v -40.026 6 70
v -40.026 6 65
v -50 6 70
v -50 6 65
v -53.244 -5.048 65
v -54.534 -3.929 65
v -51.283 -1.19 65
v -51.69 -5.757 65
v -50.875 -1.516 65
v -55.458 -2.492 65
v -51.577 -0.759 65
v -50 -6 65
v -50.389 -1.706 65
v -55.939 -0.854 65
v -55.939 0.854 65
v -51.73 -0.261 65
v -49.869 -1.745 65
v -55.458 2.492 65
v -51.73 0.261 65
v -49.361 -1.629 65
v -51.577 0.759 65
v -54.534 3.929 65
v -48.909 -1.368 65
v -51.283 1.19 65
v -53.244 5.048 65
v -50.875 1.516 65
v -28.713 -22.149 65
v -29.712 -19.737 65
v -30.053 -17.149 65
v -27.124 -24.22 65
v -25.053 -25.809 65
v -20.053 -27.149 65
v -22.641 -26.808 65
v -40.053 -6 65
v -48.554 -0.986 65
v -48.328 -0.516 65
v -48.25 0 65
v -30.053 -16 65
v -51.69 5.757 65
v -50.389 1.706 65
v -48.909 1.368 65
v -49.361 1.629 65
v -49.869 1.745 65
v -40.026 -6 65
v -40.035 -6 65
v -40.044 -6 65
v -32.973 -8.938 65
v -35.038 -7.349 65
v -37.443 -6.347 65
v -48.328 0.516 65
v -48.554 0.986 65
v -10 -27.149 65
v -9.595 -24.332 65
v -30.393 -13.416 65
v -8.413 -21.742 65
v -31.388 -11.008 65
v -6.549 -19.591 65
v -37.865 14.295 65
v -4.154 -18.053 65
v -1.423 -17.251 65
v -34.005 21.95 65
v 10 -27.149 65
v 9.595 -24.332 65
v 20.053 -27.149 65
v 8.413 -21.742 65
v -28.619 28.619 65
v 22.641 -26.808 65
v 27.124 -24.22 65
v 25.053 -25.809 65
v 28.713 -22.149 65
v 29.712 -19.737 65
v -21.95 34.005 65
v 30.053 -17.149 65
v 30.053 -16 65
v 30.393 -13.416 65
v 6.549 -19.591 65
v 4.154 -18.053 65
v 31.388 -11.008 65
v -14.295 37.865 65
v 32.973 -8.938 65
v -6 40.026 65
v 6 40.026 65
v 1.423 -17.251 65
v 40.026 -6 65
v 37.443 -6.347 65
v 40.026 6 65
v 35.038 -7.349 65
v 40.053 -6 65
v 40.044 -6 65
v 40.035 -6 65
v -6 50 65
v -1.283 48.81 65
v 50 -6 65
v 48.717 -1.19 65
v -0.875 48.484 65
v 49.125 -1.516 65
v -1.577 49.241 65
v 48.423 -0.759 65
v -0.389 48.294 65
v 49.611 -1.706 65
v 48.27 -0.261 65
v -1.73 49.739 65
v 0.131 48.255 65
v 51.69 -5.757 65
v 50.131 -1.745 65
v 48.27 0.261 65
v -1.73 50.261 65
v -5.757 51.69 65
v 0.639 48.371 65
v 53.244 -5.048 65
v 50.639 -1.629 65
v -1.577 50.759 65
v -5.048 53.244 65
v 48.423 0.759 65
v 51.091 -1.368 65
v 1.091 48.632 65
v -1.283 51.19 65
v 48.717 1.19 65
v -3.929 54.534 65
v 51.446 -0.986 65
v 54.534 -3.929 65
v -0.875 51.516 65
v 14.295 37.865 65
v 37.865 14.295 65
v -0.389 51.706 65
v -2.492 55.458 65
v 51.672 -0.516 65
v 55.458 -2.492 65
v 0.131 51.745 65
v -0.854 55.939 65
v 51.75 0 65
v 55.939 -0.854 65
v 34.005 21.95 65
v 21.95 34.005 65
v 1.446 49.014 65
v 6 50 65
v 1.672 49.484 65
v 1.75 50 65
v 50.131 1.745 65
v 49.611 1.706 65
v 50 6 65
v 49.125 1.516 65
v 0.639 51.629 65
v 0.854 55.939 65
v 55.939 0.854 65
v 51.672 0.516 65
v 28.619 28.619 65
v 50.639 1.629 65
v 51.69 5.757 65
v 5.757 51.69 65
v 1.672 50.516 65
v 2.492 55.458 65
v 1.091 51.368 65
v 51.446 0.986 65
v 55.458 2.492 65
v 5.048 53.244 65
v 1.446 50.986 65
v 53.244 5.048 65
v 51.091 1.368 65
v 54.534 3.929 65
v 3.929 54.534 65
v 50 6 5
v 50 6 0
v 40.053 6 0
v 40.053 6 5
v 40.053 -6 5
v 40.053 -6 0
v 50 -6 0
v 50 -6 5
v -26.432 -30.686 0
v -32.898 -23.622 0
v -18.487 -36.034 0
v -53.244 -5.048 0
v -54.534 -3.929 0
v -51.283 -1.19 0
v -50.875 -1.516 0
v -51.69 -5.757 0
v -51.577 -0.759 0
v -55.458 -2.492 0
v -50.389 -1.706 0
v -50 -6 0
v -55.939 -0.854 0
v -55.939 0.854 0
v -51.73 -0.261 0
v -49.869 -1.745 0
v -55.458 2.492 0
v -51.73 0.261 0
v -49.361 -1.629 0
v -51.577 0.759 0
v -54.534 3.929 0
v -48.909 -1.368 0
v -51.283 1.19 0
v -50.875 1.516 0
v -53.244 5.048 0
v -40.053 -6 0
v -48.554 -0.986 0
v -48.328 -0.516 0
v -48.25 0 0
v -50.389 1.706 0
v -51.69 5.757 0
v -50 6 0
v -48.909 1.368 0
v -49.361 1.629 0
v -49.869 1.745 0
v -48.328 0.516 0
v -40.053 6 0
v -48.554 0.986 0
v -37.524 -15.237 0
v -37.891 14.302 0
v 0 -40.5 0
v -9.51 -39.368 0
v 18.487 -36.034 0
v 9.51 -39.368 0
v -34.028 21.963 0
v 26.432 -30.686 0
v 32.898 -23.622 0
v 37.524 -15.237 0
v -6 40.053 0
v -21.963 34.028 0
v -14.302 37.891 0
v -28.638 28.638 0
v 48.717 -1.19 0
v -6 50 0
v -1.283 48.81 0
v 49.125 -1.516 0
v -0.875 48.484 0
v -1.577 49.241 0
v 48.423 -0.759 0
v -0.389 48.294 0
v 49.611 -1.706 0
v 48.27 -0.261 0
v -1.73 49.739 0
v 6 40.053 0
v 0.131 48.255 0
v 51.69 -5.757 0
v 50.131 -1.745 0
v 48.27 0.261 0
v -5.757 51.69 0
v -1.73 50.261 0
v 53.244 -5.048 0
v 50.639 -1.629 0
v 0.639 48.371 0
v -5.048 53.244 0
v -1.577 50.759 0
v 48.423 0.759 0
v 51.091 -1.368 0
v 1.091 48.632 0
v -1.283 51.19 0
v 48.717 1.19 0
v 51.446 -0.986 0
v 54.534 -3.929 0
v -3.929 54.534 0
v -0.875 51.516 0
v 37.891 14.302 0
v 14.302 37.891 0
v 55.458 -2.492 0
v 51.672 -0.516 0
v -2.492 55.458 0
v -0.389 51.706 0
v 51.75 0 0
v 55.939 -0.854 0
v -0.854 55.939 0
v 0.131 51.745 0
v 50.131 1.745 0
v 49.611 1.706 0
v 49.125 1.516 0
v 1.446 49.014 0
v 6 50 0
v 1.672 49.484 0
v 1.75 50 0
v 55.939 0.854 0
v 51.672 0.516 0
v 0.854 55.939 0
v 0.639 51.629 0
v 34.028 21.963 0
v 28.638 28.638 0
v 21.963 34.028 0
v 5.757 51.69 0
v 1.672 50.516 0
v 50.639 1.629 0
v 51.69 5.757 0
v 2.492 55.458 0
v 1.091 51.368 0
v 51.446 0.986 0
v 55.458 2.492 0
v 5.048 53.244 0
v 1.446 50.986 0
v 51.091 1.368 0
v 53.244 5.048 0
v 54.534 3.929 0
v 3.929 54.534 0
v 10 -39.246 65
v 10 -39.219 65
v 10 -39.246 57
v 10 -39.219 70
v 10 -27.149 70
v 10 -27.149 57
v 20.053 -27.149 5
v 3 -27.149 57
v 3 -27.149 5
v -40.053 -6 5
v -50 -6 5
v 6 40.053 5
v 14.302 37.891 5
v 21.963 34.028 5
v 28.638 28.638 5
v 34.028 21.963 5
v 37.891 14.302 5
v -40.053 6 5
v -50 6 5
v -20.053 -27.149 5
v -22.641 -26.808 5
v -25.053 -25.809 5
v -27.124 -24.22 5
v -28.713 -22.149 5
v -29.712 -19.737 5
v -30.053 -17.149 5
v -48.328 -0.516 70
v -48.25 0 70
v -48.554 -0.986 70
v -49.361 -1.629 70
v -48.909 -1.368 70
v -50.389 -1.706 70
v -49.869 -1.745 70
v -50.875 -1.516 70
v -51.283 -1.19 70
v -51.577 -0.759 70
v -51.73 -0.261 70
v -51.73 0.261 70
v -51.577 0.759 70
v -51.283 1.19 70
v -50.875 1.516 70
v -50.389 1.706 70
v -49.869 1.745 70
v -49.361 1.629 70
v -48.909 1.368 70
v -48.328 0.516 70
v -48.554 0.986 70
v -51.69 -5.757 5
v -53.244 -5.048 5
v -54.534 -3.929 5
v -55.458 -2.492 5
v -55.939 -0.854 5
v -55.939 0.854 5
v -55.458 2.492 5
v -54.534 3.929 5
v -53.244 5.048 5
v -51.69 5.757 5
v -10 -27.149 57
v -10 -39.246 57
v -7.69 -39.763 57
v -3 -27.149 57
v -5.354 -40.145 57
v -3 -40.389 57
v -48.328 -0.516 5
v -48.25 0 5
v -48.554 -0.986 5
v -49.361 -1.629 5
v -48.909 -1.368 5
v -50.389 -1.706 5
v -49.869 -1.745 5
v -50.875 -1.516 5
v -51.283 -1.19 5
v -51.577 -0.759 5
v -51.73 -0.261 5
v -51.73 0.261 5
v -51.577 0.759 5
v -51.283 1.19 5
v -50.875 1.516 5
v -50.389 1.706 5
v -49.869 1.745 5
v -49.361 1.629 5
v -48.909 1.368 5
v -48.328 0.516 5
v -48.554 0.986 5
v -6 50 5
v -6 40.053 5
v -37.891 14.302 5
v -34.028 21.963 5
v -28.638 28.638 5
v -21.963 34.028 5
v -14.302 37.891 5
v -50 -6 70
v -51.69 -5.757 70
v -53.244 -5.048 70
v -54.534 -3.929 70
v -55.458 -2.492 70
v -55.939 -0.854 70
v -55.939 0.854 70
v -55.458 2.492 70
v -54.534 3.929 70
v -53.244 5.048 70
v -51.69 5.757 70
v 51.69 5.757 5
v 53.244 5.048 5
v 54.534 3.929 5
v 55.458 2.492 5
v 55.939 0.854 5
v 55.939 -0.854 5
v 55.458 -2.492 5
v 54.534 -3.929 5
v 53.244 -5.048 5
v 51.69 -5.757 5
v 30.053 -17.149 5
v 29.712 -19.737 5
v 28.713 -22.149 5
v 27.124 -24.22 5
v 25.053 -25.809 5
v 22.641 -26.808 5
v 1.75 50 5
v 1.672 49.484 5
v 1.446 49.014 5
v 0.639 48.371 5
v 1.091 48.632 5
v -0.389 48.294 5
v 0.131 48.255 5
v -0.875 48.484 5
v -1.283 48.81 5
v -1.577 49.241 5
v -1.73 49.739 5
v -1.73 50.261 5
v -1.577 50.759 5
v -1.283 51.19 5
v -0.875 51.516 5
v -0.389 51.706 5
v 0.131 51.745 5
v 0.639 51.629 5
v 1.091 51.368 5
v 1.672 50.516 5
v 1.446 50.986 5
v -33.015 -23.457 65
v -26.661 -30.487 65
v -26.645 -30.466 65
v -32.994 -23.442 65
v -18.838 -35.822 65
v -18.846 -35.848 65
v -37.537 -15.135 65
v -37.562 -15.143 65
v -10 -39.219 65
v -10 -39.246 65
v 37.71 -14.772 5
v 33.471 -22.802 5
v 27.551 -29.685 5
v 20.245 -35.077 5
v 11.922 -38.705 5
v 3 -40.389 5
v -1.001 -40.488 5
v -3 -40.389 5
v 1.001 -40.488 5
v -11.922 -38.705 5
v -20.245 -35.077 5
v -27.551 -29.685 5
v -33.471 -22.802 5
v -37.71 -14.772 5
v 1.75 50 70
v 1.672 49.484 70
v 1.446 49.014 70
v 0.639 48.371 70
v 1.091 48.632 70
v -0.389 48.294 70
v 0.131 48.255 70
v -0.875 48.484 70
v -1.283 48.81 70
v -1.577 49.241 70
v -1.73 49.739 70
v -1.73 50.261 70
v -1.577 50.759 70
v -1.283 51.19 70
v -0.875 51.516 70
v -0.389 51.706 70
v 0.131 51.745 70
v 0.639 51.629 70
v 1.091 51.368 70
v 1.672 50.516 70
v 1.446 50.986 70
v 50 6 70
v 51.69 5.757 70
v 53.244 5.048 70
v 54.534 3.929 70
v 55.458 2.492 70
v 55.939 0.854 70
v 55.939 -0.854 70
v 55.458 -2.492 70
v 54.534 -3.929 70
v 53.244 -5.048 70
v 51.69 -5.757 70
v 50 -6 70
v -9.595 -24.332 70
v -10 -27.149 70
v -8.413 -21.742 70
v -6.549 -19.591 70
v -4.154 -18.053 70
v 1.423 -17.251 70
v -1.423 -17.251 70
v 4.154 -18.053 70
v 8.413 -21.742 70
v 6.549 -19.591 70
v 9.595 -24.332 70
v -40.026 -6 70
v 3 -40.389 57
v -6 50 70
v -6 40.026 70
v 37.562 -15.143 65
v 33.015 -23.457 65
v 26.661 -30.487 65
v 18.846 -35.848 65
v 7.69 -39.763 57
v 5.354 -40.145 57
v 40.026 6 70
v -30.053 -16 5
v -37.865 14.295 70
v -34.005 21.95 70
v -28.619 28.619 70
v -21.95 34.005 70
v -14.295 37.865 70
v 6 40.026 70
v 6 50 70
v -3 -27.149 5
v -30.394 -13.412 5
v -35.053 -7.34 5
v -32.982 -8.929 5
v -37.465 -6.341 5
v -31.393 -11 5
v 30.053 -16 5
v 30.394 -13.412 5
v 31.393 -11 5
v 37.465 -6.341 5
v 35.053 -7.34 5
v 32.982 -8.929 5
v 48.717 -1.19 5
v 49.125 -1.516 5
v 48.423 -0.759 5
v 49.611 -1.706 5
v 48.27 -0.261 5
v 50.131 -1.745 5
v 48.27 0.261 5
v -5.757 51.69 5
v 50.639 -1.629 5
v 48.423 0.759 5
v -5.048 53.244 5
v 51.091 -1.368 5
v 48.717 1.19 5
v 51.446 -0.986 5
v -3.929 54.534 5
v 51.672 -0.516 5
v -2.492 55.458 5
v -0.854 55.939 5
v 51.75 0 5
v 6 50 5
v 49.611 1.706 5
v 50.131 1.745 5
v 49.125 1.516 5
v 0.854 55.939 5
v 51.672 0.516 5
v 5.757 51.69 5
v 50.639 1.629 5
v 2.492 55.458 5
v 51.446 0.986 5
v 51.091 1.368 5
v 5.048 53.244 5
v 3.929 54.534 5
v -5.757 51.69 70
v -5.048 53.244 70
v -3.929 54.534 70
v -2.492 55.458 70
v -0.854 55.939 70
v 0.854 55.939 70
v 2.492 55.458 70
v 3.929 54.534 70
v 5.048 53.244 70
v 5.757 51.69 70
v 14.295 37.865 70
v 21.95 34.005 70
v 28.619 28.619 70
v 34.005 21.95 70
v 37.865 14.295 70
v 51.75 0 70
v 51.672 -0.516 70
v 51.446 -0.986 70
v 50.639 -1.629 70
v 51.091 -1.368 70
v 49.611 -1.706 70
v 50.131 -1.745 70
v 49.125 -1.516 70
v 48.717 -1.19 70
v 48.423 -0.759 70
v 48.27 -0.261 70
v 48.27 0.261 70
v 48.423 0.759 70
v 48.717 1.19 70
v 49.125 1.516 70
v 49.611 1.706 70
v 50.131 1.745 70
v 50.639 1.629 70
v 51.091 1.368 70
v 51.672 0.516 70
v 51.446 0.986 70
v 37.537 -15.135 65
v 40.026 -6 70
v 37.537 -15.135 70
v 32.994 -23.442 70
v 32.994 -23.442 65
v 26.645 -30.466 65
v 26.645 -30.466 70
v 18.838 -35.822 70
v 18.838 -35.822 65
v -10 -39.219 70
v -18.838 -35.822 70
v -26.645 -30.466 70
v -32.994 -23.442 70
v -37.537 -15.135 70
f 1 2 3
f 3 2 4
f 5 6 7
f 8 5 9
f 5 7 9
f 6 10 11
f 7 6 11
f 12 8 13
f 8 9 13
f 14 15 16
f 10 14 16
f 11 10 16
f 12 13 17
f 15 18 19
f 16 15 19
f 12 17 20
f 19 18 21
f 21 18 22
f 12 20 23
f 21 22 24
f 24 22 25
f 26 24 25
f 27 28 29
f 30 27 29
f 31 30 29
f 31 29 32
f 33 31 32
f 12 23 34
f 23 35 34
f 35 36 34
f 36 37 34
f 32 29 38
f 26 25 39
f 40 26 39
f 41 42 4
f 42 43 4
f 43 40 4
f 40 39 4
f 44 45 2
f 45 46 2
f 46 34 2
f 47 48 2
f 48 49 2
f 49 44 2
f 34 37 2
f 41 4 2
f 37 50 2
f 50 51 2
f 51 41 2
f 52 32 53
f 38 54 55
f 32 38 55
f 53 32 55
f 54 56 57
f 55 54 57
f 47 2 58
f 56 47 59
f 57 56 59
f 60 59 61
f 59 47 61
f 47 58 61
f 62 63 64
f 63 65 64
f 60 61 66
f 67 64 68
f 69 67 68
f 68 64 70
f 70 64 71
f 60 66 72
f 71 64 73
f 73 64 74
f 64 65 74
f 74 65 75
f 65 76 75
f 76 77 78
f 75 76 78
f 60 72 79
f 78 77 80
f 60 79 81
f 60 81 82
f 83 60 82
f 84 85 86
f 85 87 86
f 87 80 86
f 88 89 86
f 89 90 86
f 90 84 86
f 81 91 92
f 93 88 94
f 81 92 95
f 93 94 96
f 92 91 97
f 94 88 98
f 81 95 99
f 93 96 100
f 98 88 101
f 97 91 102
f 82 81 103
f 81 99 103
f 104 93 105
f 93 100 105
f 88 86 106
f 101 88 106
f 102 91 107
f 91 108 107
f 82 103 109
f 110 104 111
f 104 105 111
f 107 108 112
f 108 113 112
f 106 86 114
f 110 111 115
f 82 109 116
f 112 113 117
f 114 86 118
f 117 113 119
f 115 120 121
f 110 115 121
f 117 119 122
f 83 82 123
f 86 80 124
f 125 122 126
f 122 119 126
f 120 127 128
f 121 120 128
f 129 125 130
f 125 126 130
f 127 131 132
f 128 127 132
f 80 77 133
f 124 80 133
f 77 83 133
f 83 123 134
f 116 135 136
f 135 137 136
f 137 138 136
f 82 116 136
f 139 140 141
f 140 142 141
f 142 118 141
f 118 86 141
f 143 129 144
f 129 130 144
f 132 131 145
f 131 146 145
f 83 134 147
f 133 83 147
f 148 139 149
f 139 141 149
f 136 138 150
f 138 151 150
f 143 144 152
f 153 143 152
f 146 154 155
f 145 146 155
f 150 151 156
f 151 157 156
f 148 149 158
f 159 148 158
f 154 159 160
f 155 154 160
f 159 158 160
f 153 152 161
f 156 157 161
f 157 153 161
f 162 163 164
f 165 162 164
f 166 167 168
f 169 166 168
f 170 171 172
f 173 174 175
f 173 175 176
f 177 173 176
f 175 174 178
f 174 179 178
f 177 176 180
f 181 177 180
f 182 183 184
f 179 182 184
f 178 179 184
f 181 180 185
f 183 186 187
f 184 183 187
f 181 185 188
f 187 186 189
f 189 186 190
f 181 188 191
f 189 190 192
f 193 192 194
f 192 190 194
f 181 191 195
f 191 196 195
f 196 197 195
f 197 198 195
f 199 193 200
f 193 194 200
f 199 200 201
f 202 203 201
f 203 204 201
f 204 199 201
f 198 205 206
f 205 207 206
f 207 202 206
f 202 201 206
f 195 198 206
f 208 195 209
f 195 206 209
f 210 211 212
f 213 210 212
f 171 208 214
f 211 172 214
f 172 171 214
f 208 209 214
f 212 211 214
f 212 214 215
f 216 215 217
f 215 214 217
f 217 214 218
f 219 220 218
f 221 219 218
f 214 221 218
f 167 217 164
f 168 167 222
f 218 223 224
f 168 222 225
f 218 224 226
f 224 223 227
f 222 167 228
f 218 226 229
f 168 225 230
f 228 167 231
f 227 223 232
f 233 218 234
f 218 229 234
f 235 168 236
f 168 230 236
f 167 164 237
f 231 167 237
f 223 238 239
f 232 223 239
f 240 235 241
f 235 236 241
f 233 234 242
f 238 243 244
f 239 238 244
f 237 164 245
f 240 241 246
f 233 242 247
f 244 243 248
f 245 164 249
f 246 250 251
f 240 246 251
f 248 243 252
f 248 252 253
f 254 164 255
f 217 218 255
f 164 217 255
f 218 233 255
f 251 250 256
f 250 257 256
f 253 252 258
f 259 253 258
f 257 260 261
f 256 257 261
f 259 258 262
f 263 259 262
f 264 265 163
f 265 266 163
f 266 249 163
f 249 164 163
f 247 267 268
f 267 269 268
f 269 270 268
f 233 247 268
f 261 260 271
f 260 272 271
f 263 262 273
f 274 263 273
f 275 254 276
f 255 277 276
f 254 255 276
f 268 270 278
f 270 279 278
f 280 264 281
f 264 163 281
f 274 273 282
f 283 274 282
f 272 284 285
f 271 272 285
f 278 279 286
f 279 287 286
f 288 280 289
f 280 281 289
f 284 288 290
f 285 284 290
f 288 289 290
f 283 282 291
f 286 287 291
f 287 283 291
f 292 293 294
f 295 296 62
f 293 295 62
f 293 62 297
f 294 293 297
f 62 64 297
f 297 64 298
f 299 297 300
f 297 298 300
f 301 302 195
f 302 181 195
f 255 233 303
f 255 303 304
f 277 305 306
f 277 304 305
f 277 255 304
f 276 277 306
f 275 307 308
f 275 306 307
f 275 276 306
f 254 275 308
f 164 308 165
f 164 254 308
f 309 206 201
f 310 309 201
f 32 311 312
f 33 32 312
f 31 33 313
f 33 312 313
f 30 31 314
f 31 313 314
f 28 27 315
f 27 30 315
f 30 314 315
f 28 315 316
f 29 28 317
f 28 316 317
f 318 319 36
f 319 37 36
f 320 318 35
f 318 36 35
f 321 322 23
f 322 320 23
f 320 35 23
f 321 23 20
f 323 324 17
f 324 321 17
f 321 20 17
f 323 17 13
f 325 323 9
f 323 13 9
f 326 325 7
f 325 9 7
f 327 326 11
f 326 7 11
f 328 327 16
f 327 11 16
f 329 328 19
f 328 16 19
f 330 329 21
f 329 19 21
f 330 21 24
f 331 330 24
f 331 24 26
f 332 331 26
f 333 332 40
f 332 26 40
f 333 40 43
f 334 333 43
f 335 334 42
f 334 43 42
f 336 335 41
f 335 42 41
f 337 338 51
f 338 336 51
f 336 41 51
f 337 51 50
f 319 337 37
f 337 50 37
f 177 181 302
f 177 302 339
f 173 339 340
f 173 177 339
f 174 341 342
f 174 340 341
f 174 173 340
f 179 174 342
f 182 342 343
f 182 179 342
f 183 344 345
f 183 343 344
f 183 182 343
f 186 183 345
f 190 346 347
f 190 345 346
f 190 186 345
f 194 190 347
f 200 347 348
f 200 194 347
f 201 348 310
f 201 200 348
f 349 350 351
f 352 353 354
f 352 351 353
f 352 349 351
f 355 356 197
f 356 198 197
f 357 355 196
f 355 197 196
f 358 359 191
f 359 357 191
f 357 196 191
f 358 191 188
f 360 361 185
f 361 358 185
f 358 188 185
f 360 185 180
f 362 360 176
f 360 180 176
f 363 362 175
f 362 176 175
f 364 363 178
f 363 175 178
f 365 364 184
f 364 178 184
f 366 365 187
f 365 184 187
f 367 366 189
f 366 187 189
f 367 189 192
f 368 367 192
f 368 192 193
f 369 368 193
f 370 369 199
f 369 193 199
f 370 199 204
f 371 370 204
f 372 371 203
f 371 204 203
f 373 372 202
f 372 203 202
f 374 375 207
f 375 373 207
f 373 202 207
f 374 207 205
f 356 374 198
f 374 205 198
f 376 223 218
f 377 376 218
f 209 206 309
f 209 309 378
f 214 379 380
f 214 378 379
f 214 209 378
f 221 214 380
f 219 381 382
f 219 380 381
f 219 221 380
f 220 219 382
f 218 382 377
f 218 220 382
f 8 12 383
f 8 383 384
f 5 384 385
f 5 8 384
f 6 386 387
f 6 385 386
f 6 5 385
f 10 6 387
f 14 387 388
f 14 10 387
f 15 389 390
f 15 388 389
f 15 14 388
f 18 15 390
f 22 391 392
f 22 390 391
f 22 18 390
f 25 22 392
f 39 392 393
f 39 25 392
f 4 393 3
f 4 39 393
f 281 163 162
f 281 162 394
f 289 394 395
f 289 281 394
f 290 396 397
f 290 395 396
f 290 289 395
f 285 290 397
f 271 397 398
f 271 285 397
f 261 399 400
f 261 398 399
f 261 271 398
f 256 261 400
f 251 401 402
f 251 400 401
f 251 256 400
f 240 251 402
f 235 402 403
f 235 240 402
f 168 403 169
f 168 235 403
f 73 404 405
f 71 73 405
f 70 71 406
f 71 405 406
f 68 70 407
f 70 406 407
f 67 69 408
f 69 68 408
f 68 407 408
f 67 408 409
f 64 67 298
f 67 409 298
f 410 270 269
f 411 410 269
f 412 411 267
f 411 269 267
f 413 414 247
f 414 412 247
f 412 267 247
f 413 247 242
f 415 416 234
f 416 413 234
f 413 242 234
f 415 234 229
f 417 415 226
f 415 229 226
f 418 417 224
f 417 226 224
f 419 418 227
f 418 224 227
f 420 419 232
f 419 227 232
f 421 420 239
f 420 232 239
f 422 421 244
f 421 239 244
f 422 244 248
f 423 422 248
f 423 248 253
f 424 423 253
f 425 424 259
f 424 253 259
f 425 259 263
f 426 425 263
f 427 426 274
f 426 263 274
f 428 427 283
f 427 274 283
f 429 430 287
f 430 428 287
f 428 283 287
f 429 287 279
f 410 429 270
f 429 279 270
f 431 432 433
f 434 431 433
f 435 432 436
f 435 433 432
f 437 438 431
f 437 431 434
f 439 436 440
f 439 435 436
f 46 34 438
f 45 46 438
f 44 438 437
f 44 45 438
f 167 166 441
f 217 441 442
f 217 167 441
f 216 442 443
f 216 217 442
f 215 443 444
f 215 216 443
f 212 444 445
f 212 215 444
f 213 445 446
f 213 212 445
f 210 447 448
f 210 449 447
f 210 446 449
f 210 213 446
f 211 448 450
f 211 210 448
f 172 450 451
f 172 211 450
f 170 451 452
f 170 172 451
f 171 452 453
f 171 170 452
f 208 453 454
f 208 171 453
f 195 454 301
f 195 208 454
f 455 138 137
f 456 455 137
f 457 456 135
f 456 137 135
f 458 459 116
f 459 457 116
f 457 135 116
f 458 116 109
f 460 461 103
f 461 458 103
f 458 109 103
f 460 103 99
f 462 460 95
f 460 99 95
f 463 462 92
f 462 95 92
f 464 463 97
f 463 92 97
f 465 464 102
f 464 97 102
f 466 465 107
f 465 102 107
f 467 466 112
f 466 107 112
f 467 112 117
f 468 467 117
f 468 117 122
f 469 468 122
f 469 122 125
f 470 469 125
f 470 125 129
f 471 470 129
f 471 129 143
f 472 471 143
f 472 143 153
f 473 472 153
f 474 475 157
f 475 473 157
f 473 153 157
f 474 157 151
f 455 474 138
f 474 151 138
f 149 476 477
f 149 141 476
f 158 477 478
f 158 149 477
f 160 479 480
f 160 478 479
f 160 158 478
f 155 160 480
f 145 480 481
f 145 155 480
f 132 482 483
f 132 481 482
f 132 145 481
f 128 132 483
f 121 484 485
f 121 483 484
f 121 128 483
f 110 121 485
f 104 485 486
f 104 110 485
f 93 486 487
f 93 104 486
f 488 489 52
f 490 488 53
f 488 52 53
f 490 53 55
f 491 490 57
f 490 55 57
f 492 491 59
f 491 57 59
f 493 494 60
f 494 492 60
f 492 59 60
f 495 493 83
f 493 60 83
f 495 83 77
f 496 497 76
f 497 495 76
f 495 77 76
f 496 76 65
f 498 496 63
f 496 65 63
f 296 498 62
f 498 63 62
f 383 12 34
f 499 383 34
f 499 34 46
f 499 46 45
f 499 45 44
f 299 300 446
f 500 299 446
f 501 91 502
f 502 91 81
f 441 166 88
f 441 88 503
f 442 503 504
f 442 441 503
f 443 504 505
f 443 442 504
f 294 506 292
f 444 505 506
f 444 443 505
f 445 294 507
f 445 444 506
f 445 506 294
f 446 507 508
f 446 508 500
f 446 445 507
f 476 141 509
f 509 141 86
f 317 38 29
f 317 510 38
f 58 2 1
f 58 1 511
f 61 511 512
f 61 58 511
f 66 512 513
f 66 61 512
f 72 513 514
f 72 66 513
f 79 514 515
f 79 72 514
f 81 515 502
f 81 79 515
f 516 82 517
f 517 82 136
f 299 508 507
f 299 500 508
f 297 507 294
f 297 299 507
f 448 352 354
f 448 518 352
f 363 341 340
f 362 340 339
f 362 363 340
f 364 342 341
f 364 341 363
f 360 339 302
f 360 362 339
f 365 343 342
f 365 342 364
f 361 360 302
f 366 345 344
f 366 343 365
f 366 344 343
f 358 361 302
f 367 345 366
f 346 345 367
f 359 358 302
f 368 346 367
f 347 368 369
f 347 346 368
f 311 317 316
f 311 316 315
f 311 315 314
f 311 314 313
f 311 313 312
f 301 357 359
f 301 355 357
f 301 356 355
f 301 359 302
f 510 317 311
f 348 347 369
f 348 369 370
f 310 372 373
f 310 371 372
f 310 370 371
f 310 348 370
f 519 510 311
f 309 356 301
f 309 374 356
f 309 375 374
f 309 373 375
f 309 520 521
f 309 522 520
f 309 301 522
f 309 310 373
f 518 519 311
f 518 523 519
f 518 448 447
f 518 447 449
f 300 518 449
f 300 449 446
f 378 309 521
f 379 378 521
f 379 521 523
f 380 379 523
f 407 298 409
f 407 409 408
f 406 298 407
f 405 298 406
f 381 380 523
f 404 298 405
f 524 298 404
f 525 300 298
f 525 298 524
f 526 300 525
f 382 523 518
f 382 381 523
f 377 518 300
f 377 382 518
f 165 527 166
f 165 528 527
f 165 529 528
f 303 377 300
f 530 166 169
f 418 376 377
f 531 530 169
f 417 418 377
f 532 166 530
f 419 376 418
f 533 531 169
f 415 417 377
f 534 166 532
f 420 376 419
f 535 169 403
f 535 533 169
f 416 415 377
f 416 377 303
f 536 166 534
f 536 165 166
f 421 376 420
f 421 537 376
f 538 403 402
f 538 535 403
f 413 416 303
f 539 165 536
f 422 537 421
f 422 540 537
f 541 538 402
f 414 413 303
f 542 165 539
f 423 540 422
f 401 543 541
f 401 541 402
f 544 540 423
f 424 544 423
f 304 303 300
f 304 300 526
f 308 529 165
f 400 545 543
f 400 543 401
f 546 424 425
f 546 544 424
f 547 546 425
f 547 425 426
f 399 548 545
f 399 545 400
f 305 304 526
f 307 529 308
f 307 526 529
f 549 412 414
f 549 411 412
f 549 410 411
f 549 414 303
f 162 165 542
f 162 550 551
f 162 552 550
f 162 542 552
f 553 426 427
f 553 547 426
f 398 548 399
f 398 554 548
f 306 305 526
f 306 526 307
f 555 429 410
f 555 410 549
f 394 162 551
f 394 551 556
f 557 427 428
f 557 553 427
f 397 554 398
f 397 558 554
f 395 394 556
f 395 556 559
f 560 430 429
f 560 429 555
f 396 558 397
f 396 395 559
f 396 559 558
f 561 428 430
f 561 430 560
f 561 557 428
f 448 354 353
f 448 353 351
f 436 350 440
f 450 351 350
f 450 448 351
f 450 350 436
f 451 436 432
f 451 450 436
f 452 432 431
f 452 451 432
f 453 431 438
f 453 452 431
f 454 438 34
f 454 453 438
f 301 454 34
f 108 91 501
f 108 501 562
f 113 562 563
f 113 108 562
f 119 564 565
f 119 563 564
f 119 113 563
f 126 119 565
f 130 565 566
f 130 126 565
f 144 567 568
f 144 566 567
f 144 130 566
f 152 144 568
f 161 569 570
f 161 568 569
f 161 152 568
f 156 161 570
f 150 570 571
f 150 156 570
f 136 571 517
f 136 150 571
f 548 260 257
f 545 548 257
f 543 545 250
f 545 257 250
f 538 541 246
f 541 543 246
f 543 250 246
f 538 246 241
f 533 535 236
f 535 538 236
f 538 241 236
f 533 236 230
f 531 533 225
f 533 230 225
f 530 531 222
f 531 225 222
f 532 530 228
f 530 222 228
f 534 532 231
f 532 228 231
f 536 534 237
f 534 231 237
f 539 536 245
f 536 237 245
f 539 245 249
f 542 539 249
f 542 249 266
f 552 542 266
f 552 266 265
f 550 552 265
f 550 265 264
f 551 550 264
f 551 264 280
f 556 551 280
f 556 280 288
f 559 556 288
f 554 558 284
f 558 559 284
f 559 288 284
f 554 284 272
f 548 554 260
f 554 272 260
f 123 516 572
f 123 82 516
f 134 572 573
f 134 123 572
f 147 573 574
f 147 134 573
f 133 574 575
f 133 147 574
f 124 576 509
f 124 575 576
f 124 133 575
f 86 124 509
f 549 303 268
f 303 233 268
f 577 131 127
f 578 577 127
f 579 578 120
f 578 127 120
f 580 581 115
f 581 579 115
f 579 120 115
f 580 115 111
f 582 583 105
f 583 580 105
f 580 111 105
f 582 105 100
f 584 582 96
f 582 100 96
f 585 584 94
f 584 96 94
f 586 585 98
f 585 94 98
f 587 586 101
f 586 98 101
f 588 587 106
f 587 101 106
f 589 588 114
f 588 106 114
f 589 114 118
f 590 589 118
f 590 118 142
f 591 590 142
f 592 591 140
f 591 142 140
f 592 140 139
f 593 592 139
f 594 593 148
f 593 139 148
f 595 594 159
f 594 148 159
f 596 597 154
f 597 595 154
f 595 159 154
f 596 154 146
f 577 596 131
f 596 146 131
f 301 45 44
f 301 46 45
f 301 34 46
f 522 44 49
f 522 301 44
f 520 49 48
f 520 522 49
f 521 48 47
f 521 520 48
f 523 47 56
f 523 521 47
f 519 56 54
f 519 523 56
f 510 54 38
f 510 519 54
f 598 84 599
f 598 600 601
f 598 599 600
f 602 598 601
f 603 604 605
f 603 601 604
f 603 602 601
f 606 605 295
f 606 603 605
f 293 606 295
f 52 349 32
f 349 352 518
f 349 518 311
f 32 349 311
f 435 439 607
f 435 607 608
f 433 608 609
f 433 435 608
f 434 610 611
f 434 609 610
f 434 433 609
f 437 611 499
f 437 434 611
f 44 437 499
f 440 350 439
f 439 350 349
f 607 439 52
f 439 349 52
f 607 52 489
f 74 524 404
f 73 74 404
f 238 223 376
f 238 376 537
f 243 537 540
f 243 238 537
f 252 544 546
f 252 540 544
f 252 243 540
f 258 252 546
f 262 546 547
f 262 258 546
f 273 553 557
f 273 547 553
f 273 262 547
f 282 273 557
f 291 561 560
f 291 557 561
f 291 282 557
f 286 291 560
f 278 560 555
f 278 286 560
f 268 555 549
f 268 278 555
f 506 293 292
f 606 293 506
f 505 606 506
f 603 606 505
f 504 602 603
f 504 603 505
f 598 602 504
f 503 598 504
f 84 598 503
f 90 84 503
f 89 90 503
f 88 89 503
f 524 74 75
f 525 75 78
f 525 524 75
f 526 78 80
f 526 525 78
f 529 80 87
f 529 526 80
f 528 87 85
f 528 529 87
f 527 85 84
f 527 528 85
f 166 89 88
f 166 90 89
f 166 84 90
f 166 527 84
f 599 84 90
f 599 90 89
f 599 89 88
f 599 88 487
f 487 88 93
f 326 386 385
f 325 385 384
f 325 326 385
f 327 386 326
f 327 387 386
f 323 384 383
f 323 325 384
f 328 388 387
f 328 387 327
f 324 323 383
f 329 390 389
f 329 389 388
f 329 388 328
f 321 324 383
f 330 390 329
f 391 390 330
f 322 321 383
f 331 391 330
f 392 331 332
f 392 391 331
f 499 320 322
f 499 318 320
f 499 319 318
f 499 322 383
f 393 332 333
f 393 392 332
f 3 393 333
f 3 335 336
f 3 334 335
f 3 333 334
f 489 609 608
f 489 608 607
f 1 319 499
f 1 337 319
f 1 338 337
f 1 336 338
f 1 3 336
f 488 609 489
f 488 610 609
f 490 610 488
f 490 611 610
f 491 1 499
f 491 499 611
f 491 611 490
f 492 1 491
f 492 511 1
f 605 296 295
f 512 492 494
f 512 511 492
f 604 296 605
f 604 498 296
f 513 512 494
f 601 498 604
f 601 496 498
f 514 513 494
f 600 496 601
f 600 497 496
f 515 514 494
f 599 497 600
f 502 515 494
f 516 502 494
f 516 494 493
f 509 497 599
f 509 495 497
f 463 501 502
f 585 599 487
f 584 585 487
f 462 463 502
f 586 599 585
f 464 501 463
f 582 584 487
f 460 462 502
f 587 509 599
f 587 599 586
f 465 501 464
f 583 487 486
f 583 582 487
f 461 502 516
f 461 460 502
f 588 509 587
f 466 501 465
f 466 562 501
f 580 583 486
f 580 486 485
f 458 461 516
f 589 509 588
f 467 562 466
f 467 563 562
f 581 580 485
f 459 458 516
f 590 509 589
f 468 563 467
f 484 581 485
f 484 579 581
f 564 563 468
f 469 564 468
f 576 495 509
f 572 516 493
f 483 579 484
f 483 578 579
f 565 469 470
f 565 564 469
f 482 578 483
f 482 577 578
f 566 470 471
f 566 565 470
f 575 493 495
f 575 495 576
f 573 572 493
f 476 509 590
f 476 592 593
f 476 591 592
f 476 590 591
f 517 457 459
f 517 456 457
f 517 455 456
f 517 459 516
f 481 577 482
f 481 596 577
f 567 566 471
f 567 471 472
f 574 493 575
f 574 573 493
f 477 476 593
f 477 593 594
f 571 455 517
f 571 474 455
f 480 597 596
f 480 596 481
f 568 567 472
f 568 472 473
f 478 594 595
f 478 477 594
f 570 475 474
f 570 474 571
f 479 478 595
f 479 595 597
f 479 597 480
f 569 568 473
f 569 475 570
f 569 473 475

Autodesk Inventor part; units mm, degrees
ref_plane "YZ Plane" through (0, 0, 0) normal (1, 0, 0) x (0, 1, 0)
ref_plane "XZ Plane" through (0, 0, 0) normal (0, 1, 0) x (-1, 0, 0)
ref_plane "XY Plane" through (0, 0, 0) normal (0, 0, 1) x (1, 0, 0)
sketch "Sketch1" plane through (0, 0, 0) normal (0, 0, 1) x (1, 0, 0)
  circle A0 centre (0, 0) radius 40.5
  line L0 (0, 0) -> (0, 50) construction
  arc A1 (6, 50) -> (-6, 50) centre (0, 50) ccw
  line L1 (0, 0) -> (50, 0) construction
  arc A2 (50, -6) -> (50, 6) centre (50, 0) ccw
  line L2 (0, 0) -> (-50, 0) construction
  arc A3 (-50, 6) -> (-50, -6) centre (-50, 0) ccw
  line L3 (-6, 50) -> (-6, 40.0531)
  line L4 (6, 40.0531) -> (6, 50)
  line L5 (-40.0531, 6) -> (-50, 6)
  line L6 (-50, -6) -> (-40.0531, -6)
  line L7 (50, 6) -> (40.0531, 6)
  line L8 (40.0531, -6) -> (50, -6)
  circle A4 centre (-50, 0) radius 1.75
  circle A5 centre (0, 50) radius 1.75
  circle A6 centre (50, 0) radius 1.75
  point P0 (0, 25)
  point P1 (25, 0)
  point P2 (-25, 0)
  dimension "d0" = 81
  dimension "d3" = 50
  dimension "d4" = 12
  dimension "d5" = 50
  dimension "d6" = 12
  dimension "d7" = 50
  dimension "d8" = 12
  dimension "d9" = 3.5
  dimension "d10" = 3.5
  dimension "d11" = 3.5
extrude "Extrusion2" add sketch "Sketch1" along normal blind 5
sketch "Sketch2" plane through (0, 0, 5) normal (0, 0, 1) x (1, 0, 0)
  arc A0 (-40.0531, -6) -> (40.0531, -6) centre (0, 0) ccw projected
  line L0 (-40.0531, -6) -> (-40.0531, -6)
  line L1 (-40.0531, -6) -> (-40.0531, -6) construction
  line L2 (-30.0531, -16) -> (-30.0531, -17.1489)
  line L3 (40.0531, -6) -> (40.0531, -6)
  line L4 (30.0531, -16) -> (30.0531, -17.1489)
  arc A1 (-30.0531, -17.1489) -> (-20.0531, -27.1489) centre (-20.0531, -17.1489) ccw
  arc A2 (20.0531, -27.1489) -> (30.0531, -17.1489) centre (20.0531, -17.1489) ccw
  arc A3 (40.0531, -6) -> (30.0531, -16) centre (40.0531, -16) ccw
  arc A4 (-30.0531, -16) -> (-40.0531, -6) centre (-40.0531, -16) ccw
  line L5 (-3, -27.1489) -> (-3, -40.3887)
  line L6 (3, -27.1489) -> (3, -40.3887)
  line L7 (20.0531, -27.1489) -> (3, -27.1489)
  line L8 (-3, -27.1489) -> (-20.0531, -27.1489)
  point P0 (-30.0531, -6)
  point P1 (-30.0531, -27.1489)
  point P2 (30.0531, -6)
  point P3 (30.0531, -27.1489)
  dimension "d16" = 10
  dimension "d17" = 0
  dimension "d18" = 90
  dimension "d19" = 10
  dimension "d20" = 10
extrude "Extrusion3" add sketch "Sketch2" along normal blind 60
sketch "Sketch3" plane through (0, 0, 65) normal (0, 0, 1) x (1, 0, 0)
  arc A0 (3, -40.3621) -> (-3, -40.3621) centre (0, 0) ccw
  arc A1 (6, 50) -> (-6, 50) centre (0, 50) ccw projected
  line L0 (0, 0) -> (0, 50) construction
  line L1 (6, 0) -> (6, 50)
  line L2 (-6, 50) -> (-6, 0)
  arc A2 (-6, 0) -> (6, 0) centre (0, 0) ccw
  arc A3 (6, 50) -> (-6, 50) centre (0, 50) ccw
  line L3 (0, 0) -> (50, 0) construction
  line L4 (0, 0) -> (50, 0) construction
  line L5 (0, -6) -> (50, -6)
  line L6 (50, 6) -> (0, 6)
  arc A4 (0, 6) -> (0, -6) centre (0, 0) ccw
  arc A5 (50, -6) -> (50, 6) centre (50, 0) ccw
  line L7 (0, 0) -> (-50, 0) construction
  line L8 (0, 6) -> (-50, 6)
  line L9 (-50, -6) -> (0, -6)
  arc A6 (0, -6) -> (0, 6) centre (0, 0) ccw
  arc A7 (-50, 6) -> (-50, -6) centre (-50, 0) ccw
  circle A8 centre (50, 0) radius 1.75
  circle A9 centre (-50, 0) radius 1.75
  circle A10 centre (0, 50) radius 1.75
  line L10 (-3, -40.3887) -> (-3, -36.6883)
  line L11 (3, -36.6883) -> (3, -40.3887)
  arc A11 (3, -36.6883) -> (-3, -36.6883) centre (0, -27.1489) ccw
  point P0 (0, 25)
  point P1 (25, 0)
  point P2 (-25, 0)
  dimension "d26" = 50
  dimension "d27" = 90
  dimension "d28" = 12
  dimension "d29" = 50
  dimension "d30" = 12
  dimension "d31" = 50
  dimension "d32" = 12
  dimension "d33" = 3.5
  dimension "d34" = 3.5
  dimension "d35" = 3.5
  dimension "d45" = 20
extrude "Extrusion4" add sketch "Sketch3" along normal blind 5
sketch "Sketch4" plane through (3, -27.1489, 5) normal (0, 1, 0) x (1, 0, 0)
  line L0 (7, -60) -> (0, -60) projected
  line L1 (-6, -60) -> (-13, -60) projected
  line L2 (0, -70) -> (5, -70) projected
  line L3 (5, -70) -> (13, -70) construction
  line L4 (-6, -60) -> (-43.0263, -60) projected
  line L5 (-11, -70) -> (-3, -70) construction
  line L6 (7, -60) -> (-13, -60)
  line L7 (-13, -60) -> (-13, -52)
  line L8 (-13, -52) -> (7, -52)
  line L9 (7, -52) -> (7, -60)
  line L10 (7, -60) -> (-13, -60)
  line L11 (-13, -60) -> (-13, -65)
  line L12 (-13, -65) -> (7, -65)
  line L13 (7, -65) -> (7, -60)
  point P0 (-3, 5)
  point P1 (0, -60)
  dimension "d46" = 8
  dimension "d47" = 20
  dimension "d48" = 5
extrude "Extrusion5" cut sketch "Sketch4" against normal blind 15
ref_plane "Work Plane1" through (0, 0, 65) normal (-1, 0, 0) x (0, 1, 0)
properties part number "Astra_slot"
